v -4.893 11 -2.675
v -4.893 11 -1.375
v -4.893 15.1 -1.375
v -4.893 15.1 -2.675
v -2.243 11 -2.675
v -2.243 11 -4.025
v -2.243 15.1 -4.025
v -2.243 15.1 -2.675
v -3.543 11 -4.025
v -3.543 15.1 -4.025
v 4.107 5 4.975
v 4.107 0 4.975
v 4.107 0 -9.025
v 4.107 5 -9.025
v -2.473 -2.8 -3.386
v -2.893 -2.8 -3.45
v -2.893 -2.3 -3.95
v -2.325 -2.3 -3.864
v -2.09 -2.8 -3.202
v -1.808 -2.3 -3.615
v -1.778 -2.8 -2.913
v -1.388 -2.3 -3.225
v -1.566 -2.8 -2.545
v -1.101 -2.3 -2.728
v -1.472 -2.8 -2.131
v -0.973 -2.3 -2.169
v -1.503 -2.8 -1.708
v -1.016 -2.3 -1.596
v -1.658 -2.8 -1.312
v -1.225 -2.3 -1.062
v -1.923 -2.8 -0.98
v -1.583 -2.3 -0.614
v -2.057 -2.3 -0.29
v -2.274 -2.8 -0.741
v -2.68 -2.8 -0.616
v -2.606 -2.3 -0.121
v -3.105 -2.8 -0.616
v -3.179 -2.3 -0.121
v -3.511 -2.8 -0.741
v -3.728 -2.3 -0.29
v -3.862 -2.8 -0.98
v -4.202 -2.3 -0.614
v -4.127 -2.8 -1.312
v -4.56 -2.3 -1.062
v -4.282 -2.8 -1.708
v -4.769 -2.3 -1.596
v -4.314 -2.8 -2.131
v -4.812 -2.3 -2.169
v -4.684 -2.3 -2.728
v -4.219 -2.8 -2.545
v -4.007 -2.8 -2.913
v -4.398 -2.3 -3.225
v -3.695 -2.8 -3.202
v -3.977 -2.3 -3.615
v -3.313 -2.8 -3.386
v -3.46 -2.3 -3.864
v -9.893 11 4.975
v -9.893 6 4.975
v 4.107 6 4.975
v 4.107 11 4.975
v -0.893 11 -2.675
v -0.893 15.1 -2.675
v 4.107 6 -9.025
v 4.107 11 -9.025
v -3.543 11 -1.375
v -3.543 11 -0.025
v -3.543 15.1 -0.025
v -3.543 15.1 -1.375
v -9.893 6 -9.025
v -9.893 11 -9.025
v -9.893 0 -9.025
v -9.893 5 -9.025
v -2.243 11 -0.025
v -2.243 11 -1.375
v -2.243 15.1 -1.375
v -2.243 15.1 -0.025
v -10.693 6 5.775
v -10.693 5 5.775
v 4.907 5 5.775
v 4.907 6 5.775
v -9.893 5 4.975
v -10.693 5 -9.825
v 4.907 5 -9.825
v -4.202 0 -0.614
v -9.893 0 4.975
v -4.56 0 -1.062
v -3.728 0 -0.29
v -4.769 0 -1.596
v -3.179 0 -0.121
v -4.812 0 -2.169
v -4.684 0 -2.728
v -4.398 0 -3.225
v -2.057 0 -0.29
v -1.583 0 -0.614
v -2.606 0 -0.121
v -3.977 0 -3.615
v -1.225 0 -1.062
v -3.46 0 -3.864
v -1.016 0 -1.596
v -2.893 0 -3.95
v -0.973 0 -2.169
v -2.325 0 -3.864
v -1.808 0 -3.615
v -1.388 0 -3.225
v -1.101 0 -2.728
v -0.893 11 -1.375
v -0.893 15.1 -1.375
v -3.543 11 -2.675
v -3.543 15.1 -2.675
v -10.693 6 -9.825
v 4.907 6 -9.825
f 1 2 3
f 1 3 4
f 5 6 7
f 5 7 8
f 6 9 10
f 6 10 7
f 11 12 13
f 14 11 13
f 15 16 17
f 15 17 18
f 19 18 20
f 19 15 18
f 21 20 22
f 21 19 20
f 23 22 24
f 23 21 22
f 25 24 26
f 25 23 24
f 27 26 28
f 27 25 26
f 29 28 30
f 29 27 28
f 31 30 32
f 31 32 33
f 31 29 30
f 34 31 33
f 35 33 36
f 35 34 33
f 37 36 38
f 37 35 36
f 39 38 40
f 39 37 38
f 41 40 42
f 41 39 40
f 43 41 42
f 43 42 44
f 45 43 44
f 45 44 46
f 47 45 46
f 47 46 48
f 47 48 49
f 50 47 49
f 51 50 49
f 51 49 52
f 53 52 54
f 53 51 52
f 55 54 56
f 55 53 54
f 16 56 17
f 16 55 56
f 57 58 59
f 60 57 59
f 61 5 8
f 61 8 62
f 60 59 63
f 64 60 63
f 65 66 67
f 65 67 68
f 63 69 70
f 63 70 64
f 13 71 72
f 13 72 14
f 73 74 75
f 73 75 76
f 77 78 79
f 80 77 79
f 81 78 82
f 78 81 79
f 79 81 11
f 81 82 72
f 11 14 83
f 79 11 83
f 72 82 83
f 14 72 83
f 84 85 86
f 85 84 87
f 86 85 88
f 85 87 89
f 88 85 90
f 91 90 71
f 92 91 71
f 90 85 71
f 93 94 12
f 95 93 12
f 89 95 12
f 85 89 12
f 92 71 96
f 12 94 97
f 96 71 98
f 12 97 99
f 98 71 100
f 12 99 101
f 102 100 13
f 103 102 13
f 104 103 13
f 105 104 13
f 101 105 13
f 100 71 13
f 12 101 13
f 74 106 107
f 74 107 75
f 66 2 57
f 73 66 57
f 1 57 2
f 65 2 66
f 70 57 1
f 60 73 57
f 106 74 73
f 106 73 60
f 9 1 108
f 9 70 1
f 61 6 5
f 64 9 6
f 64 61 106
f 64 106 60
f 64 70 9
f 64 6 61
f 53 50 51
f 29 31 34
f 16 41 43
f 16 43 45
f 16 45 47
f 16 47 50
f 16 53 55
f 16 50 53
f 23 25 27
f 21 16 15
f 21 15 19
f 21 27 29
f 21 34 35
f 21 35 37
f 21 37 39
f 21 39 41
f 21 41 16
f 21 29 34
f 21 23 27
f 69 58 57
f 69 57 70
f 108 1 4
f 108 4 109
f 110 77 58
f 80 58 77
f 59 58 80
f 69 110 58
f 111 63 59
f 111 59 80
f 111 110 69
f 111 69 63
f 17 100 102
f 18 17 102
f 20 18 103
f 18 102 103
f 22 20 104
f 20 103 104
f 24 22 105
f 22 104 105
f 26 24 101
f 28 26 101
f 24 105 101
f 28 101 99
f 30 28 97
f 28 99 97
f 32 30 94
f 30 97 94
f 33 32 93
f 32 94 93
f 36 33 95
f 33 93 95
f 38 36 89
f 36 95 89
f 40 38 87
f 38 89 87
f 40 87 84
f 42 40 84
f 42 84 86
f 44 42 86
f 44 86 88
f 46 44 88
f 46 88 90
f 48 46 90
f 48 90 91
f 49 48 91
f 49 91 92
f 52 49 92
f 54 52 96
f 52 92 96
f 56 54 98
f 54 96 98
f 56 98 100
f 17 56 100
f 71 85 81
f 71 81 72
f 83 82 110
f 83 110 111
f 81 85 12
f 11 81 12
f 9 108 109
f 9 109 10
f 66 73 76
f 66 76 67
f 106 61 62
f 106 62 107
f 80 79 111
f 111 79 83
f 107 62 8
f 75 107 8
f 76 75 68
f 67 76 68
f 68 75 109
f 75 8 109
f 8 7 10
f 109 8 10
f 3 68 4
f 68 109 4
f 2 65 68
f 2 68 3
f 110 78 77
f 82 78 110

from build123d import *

# Parameters (mm, degrees)
SKETCH_1_W      = 14
SKETCH_1_H      = 14
EXTRUDE_1_DEPTH = 5
SKETCH_2_R      = 1.925
EXTRUDE_2_DEPTH = 2.8
CHAMFER_1_SIZE  = 0.5
SKETCH_3_W      = 15.6
SKETCH_3_H      = 15.6
EXTRUDE_3_DEPTH = 1
SKETCH_4_W      = 14
SKETCH_4_H      = 14
EXTRUDE_4_DEPTH = 5
EXTRUDE_5_DEPTH = 4.1


with BuildPart() as part:
    # 草图1 → 凸台-拉伸1 (new body)
    with BuildSketch(Plane(origin=(0, 0, 0), x_dir=(1, 0, 0), z_dir=(0, 1, 0))):
        with Locations((-2.892561983, 2.024793388)):
            Rectangle(SKETCH_1_W, SKETCH_1_H)
    extrude(amount=EXTRUDE_1_DEPTH)

    # 草图2 → 凸台-拉伸2 (add)
    with BuildSketch(Plane.XZ):
        with Locations(Location((-2.892561983, -2.024793388, 0), (0, 0, 270))):
            Circle(SKETCH_2_R)
    extrude(amount=EXTRUDE_2_DEPTH)

    # 倒角1
    chamfer_1_edges = [part.edges().sort_by_distance(p)[0] for p in [
        (-2.892561983, -2.8, -0.099793388),
    ]]
    chamfer(chamfer_1_edges, length=CHAMFER_1_SIZE)

    # 草图3 → 凸台-拉伸3 (add)
    with BuildSketch(Plane(origin=(0, 5, 0), x_dir=(1, 0, 0), z_dir=(0, 1, 0))):
        with Locations((-2.892561983, 2.024793388)):
            Rectangle(SKETCH_3_W, SKETCH_3_H)
    extrude(amount=EXTRUDE_3_DEPTH)

    # 草图4 → 凸台-拉伸4 (add)
    with BuildSketch(Plane(origin=(0, 6, 0), x_dir=(1, 0, 0), z_dir=(0, 1, 0))):
        with Locations((-2.892561983, 2.024793388)):
            Rectangle(SKETCH_4_W, SKETCH_4_H)
    extrude(amount=EXTRUDE_4_DEPTH)

    # 草图5 → 凸台-拉伸5 (add)
    with BuildSketch(Plane(origin=(0, 11, 0), x_dir=(1, 0, 0), z_dir=(0, 1, 0))):
        Polygon((-3.542561983, 2.674793388), (-3.542561983, 4.024793388), (-2.242561983, 4.024793388), (-2.242561983, 2.674793388), (-0.892561983, 2.674793388), (-0.892561983, 1.374793388), (-2.242561983, 1.374793388), (-2.242561983, 0.024793388), (-3.542561983, 0.024793388), (-3.542561983, 1.374793388), (-4.892561983, 1.374793388), (-4.892561983, 2.674793388), align=None)
    extrude(amount=EXTRUDE_5_DEPTH)


solid = part.part
